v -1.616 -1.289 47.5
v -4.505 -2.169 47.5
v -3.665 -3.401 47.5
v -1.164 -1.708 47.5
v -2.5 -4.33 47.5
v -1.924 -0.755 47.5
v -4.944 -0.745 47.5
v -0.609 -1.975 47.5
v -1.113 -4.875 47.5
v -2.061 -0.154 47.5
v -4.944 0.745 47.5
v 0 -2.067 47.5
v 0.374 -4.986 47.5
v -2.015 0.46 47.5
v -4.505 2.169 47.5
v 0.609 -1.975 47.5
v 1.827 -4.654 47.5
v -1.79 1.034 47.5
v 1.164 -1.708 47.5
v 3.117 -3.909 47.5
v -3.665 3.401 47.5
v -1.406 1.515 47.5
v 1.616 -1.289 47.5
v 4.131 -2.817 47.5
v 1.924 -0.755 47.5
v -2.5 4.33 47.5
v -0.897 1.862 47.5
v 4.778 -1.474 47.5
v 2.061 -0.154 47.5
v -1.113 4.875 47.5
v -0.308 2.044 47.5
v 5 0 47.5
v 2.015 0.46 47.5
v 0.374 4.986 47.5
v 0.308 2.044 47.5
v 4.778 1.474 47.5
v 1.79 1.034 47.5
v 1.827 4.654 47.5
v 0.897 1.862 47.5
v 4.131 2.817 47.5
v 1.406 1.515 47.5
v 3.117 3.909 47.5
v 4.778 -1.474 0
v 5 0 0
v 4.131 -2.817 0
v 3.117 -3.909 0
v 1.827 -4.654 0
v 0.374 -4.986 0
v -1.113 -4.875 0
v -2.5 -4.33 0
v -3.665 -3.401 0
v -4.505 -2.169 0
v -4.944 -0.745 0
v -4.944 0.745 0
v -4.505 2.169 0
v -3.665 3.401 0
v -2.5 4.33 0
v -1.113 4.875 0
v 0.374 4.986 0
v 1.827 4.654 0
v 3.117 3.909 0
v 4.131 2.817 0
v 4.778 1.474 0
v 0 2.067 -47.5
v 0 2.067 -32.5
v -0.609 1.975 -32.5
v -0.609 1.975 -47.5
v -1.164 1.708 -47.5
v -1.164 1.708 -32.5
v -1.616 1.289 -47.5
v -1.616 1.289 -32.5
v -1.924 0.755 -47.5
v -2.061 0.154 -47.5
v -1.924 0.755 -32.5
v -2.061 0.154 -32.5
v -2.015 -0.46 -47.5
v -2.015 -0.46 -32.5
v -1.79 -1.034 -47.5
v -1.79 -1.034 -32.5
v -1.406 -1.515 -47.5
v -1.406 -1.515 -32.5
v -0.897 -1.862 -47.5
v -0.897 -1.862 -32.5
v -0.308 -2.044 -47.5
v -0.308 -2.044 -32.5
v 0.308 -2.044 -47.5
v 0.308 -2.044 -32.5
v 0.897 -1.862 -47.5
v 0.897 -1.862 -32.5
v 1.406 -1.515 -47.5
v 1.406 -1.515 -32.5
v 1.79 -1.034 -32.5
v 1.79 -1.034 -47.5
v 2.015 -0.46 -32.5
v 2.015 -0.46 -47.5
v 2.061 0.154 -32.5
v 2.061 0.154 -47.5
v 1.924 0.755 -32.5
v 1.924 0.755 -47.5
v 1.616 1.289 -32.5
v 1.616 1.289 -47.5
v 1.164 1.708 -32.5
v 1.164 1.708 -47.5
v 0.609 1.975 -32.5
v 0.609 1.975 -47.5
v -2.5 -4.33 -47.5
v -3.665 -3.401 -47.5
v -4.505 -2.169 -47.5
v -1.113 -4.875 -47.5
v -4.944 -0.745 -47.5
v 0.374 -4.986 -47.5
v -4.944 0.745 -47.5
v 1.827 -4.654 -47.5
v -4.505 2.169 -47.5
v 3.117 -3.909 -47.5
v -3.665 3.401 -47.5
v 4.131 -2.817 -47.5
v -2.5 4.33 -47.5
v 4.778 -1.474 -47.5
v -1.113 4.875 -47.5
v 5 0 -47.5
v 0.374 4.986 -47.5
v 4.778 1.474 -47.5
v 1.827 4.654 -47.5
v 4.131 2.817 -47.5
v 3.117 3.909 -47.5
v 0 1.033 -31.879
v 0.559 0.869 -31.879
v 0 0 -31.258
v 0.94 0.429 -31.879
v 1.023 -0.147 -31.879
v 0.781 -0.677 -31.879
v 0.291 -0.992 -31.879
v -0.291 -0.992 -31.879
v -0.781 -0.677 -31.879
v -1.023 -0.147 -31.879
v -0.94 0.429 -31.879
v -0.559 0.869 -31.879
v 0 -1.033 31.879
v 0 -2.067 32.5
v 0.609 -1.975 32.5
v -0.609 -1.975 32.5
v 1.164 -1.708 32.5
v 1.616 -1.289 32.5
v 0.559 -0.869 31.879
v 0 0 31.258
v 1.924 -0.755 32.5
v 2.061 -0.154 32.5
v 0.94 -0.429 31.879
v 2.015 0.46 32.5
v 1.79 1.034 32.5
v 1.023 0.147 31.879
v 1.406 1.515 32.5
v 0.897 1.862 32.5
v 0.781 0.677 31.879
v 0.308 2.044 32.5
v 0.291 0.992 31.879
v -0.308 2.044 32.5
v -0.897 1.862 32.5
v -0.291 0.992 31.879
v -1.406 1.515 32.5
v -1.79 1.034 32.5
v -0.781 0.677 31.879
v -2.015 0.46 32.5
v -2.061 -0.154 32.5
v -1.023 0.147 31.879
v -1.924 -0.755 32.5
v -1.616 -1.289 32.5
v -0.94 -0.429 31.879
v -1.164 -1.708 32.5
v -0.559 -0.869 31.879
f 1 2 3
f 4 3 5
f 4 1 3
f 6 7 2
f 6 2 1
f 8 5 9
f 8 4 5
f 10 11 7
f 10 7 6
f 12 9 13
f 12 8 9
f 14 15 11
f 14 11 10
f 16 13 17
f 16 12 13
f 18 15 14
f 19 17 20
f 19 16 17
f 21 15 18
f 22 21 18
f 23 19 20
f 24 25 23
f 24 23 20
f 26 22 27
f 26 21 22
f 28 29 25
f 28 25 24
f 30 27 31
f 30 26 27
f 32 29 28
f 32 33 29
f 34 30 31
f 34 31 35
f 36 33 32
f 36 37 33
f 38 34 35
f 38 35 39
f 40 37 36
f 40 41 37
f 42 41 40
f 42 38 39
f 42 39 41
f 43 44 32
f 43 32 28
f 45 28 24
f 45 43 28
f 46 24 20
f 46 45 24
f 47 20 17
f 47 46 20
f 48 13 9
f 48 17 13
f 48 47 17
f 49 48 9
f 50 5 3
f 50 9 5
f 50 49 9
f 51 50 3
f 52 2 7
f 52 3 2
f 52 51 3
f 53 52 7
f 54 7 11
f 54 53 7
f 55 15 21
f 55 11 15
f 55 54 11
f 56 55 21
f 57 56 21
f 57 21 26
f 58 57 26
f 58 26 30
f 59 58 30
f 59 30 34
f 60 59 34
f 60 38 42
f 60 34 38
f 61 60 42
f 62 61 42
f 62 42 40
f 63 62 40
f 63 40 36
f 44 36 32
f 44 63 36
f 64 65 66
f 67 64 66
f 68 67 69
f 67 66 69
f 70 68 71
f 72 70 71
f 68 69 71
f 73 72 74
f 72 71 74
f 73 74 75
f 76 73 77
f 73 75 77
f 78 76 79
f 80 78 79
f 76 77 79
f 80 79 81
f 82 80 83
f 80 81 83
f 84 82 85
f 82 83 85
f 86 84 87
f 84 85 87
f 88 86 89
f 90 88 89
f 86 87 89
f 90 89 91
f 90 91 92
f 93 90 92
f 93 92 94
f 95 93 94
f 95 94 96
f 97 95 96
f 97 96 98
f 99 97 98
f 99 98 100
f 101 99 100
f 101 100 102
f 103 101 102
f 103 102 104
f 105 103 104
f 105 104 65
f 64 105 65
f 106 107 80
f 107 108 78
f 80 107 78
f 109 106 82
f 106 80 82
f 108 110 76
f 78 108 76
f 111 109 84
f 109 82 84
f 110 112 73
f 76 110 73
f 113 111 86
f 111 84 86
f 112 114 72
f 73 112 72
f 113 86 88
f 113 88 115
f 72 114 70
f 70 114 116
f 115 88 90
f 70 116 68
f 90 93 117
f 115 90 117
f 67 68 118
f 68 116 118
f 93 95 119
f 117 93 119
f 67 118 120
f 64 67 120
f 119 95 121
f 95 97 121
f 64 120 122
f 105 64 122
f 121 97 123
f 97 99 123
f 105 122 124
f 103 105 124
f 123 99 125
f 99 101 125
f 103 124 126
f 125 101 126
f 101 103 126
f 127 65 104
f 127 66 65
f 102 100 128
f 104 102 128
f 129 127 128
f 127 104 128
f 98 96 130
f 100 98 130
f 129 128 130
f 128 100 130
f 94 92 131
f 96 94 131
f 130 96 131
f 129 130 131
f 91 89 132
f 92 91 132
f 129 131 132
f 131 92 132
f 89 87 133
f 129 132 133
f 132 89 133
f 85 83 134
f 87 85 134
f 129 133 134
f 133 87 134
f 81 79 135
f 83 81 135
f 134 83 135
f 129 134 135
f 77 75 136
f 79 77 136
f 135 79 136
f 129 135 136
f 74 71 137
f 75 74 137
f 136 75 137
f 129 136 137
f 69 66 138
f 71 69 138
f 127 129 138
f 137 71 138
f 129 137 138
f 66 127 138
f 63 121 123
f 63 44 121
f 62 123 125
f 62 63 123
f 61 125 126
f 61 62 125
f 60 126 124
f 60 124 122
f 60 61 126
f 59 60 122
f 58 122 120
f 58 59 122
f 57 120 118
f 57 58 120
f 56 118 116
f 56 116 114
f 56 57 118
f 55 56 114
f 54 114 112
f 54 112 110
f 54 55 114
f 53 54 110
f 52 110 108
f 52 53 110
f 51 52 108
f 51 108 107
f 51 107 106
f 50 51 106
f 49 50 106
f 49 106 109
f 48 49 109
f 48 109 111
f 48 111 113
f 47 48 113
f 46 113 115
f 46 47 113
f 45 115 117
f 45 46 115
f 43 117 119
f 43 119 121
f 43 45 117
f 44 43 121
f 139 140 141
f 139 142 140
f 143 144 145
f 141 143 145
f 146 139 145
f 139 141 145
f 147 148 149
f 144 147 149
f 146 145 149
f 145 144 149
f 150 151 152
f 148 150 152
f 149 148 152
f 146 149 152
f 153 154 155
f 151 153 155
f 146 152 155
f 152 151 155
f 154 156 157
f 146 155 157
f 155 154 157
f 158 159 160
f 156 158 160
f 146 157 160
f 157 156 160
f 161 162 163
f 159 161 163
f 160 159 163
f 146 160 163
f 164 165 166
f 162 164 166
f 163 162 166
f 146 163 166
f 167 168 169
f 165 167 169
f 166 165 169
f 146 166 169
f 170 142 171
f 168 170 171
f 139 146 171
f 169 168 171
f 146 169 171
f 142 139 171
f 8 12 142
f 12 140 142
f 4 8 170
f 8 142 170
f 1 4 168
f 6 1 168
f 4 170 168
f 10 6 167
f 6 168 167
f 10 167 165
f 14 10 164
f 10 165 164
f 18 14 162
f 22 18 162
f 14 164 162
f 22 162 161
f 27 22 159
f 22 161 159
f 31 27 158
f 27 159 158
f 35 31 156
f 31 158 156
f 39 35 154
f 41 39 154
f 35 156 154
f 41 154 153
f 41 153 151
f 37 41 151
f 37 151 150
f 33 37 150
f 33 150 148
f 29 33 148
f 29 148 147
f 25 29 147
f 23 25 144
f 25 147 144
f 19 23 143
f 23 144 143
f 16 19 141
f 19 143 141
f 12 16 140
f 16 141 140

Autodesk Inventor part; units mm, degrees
ref_plane "YZ Plane" through (0, 0, 0) normal (1, 0, 0) x (0, 1, 0)
ref_plane "XZ Plane" through (0, 0, 0) normal (0, 1, 0) x (-1, 0, 0)
ref_plane "XY Plane" through (0, 0, 0) normal (0, 0, 1) x (1, 0, 0)
sketch "Boceto1" plane through (0, 0, 0) normal (0, 0, 1) x (1, 0, 0)
  circle A0 centre (0, 0) radius 5
  dimension "d0" = 10
extrude "Cuerpo manija" add sketch "Boceto1" along normal mid plane 95
sketch "Boceto2" plane through (0, 0, 47.5) normal (0, 0, 1) x (1, 0, 0)
  circle A0 centre (0, 0) radius 5 projected
hole "M5X0.7 15" at (0, 0, 47.5) direction (0, 0, -1) diameter 4.134 depth 15 tip angle 118 thread size "M5x0.8" class "6H" standard "ISO Metric profile"
sketch "Boceto3" plane through (0, 0, -47.5) normal (0, 0, -1) x (-1, 0, 0)
  point P0 (0, 0)
  point P1 (0, 0)
hole "M%X0.7 P15" at (0, 0, -47.5) direction (0, 0, 1) diameter 4.134 depth 15 tip angle 118 thread size "M5x0.8" class "6H" standard "ISO Metric profile"
properties part number "eje"
